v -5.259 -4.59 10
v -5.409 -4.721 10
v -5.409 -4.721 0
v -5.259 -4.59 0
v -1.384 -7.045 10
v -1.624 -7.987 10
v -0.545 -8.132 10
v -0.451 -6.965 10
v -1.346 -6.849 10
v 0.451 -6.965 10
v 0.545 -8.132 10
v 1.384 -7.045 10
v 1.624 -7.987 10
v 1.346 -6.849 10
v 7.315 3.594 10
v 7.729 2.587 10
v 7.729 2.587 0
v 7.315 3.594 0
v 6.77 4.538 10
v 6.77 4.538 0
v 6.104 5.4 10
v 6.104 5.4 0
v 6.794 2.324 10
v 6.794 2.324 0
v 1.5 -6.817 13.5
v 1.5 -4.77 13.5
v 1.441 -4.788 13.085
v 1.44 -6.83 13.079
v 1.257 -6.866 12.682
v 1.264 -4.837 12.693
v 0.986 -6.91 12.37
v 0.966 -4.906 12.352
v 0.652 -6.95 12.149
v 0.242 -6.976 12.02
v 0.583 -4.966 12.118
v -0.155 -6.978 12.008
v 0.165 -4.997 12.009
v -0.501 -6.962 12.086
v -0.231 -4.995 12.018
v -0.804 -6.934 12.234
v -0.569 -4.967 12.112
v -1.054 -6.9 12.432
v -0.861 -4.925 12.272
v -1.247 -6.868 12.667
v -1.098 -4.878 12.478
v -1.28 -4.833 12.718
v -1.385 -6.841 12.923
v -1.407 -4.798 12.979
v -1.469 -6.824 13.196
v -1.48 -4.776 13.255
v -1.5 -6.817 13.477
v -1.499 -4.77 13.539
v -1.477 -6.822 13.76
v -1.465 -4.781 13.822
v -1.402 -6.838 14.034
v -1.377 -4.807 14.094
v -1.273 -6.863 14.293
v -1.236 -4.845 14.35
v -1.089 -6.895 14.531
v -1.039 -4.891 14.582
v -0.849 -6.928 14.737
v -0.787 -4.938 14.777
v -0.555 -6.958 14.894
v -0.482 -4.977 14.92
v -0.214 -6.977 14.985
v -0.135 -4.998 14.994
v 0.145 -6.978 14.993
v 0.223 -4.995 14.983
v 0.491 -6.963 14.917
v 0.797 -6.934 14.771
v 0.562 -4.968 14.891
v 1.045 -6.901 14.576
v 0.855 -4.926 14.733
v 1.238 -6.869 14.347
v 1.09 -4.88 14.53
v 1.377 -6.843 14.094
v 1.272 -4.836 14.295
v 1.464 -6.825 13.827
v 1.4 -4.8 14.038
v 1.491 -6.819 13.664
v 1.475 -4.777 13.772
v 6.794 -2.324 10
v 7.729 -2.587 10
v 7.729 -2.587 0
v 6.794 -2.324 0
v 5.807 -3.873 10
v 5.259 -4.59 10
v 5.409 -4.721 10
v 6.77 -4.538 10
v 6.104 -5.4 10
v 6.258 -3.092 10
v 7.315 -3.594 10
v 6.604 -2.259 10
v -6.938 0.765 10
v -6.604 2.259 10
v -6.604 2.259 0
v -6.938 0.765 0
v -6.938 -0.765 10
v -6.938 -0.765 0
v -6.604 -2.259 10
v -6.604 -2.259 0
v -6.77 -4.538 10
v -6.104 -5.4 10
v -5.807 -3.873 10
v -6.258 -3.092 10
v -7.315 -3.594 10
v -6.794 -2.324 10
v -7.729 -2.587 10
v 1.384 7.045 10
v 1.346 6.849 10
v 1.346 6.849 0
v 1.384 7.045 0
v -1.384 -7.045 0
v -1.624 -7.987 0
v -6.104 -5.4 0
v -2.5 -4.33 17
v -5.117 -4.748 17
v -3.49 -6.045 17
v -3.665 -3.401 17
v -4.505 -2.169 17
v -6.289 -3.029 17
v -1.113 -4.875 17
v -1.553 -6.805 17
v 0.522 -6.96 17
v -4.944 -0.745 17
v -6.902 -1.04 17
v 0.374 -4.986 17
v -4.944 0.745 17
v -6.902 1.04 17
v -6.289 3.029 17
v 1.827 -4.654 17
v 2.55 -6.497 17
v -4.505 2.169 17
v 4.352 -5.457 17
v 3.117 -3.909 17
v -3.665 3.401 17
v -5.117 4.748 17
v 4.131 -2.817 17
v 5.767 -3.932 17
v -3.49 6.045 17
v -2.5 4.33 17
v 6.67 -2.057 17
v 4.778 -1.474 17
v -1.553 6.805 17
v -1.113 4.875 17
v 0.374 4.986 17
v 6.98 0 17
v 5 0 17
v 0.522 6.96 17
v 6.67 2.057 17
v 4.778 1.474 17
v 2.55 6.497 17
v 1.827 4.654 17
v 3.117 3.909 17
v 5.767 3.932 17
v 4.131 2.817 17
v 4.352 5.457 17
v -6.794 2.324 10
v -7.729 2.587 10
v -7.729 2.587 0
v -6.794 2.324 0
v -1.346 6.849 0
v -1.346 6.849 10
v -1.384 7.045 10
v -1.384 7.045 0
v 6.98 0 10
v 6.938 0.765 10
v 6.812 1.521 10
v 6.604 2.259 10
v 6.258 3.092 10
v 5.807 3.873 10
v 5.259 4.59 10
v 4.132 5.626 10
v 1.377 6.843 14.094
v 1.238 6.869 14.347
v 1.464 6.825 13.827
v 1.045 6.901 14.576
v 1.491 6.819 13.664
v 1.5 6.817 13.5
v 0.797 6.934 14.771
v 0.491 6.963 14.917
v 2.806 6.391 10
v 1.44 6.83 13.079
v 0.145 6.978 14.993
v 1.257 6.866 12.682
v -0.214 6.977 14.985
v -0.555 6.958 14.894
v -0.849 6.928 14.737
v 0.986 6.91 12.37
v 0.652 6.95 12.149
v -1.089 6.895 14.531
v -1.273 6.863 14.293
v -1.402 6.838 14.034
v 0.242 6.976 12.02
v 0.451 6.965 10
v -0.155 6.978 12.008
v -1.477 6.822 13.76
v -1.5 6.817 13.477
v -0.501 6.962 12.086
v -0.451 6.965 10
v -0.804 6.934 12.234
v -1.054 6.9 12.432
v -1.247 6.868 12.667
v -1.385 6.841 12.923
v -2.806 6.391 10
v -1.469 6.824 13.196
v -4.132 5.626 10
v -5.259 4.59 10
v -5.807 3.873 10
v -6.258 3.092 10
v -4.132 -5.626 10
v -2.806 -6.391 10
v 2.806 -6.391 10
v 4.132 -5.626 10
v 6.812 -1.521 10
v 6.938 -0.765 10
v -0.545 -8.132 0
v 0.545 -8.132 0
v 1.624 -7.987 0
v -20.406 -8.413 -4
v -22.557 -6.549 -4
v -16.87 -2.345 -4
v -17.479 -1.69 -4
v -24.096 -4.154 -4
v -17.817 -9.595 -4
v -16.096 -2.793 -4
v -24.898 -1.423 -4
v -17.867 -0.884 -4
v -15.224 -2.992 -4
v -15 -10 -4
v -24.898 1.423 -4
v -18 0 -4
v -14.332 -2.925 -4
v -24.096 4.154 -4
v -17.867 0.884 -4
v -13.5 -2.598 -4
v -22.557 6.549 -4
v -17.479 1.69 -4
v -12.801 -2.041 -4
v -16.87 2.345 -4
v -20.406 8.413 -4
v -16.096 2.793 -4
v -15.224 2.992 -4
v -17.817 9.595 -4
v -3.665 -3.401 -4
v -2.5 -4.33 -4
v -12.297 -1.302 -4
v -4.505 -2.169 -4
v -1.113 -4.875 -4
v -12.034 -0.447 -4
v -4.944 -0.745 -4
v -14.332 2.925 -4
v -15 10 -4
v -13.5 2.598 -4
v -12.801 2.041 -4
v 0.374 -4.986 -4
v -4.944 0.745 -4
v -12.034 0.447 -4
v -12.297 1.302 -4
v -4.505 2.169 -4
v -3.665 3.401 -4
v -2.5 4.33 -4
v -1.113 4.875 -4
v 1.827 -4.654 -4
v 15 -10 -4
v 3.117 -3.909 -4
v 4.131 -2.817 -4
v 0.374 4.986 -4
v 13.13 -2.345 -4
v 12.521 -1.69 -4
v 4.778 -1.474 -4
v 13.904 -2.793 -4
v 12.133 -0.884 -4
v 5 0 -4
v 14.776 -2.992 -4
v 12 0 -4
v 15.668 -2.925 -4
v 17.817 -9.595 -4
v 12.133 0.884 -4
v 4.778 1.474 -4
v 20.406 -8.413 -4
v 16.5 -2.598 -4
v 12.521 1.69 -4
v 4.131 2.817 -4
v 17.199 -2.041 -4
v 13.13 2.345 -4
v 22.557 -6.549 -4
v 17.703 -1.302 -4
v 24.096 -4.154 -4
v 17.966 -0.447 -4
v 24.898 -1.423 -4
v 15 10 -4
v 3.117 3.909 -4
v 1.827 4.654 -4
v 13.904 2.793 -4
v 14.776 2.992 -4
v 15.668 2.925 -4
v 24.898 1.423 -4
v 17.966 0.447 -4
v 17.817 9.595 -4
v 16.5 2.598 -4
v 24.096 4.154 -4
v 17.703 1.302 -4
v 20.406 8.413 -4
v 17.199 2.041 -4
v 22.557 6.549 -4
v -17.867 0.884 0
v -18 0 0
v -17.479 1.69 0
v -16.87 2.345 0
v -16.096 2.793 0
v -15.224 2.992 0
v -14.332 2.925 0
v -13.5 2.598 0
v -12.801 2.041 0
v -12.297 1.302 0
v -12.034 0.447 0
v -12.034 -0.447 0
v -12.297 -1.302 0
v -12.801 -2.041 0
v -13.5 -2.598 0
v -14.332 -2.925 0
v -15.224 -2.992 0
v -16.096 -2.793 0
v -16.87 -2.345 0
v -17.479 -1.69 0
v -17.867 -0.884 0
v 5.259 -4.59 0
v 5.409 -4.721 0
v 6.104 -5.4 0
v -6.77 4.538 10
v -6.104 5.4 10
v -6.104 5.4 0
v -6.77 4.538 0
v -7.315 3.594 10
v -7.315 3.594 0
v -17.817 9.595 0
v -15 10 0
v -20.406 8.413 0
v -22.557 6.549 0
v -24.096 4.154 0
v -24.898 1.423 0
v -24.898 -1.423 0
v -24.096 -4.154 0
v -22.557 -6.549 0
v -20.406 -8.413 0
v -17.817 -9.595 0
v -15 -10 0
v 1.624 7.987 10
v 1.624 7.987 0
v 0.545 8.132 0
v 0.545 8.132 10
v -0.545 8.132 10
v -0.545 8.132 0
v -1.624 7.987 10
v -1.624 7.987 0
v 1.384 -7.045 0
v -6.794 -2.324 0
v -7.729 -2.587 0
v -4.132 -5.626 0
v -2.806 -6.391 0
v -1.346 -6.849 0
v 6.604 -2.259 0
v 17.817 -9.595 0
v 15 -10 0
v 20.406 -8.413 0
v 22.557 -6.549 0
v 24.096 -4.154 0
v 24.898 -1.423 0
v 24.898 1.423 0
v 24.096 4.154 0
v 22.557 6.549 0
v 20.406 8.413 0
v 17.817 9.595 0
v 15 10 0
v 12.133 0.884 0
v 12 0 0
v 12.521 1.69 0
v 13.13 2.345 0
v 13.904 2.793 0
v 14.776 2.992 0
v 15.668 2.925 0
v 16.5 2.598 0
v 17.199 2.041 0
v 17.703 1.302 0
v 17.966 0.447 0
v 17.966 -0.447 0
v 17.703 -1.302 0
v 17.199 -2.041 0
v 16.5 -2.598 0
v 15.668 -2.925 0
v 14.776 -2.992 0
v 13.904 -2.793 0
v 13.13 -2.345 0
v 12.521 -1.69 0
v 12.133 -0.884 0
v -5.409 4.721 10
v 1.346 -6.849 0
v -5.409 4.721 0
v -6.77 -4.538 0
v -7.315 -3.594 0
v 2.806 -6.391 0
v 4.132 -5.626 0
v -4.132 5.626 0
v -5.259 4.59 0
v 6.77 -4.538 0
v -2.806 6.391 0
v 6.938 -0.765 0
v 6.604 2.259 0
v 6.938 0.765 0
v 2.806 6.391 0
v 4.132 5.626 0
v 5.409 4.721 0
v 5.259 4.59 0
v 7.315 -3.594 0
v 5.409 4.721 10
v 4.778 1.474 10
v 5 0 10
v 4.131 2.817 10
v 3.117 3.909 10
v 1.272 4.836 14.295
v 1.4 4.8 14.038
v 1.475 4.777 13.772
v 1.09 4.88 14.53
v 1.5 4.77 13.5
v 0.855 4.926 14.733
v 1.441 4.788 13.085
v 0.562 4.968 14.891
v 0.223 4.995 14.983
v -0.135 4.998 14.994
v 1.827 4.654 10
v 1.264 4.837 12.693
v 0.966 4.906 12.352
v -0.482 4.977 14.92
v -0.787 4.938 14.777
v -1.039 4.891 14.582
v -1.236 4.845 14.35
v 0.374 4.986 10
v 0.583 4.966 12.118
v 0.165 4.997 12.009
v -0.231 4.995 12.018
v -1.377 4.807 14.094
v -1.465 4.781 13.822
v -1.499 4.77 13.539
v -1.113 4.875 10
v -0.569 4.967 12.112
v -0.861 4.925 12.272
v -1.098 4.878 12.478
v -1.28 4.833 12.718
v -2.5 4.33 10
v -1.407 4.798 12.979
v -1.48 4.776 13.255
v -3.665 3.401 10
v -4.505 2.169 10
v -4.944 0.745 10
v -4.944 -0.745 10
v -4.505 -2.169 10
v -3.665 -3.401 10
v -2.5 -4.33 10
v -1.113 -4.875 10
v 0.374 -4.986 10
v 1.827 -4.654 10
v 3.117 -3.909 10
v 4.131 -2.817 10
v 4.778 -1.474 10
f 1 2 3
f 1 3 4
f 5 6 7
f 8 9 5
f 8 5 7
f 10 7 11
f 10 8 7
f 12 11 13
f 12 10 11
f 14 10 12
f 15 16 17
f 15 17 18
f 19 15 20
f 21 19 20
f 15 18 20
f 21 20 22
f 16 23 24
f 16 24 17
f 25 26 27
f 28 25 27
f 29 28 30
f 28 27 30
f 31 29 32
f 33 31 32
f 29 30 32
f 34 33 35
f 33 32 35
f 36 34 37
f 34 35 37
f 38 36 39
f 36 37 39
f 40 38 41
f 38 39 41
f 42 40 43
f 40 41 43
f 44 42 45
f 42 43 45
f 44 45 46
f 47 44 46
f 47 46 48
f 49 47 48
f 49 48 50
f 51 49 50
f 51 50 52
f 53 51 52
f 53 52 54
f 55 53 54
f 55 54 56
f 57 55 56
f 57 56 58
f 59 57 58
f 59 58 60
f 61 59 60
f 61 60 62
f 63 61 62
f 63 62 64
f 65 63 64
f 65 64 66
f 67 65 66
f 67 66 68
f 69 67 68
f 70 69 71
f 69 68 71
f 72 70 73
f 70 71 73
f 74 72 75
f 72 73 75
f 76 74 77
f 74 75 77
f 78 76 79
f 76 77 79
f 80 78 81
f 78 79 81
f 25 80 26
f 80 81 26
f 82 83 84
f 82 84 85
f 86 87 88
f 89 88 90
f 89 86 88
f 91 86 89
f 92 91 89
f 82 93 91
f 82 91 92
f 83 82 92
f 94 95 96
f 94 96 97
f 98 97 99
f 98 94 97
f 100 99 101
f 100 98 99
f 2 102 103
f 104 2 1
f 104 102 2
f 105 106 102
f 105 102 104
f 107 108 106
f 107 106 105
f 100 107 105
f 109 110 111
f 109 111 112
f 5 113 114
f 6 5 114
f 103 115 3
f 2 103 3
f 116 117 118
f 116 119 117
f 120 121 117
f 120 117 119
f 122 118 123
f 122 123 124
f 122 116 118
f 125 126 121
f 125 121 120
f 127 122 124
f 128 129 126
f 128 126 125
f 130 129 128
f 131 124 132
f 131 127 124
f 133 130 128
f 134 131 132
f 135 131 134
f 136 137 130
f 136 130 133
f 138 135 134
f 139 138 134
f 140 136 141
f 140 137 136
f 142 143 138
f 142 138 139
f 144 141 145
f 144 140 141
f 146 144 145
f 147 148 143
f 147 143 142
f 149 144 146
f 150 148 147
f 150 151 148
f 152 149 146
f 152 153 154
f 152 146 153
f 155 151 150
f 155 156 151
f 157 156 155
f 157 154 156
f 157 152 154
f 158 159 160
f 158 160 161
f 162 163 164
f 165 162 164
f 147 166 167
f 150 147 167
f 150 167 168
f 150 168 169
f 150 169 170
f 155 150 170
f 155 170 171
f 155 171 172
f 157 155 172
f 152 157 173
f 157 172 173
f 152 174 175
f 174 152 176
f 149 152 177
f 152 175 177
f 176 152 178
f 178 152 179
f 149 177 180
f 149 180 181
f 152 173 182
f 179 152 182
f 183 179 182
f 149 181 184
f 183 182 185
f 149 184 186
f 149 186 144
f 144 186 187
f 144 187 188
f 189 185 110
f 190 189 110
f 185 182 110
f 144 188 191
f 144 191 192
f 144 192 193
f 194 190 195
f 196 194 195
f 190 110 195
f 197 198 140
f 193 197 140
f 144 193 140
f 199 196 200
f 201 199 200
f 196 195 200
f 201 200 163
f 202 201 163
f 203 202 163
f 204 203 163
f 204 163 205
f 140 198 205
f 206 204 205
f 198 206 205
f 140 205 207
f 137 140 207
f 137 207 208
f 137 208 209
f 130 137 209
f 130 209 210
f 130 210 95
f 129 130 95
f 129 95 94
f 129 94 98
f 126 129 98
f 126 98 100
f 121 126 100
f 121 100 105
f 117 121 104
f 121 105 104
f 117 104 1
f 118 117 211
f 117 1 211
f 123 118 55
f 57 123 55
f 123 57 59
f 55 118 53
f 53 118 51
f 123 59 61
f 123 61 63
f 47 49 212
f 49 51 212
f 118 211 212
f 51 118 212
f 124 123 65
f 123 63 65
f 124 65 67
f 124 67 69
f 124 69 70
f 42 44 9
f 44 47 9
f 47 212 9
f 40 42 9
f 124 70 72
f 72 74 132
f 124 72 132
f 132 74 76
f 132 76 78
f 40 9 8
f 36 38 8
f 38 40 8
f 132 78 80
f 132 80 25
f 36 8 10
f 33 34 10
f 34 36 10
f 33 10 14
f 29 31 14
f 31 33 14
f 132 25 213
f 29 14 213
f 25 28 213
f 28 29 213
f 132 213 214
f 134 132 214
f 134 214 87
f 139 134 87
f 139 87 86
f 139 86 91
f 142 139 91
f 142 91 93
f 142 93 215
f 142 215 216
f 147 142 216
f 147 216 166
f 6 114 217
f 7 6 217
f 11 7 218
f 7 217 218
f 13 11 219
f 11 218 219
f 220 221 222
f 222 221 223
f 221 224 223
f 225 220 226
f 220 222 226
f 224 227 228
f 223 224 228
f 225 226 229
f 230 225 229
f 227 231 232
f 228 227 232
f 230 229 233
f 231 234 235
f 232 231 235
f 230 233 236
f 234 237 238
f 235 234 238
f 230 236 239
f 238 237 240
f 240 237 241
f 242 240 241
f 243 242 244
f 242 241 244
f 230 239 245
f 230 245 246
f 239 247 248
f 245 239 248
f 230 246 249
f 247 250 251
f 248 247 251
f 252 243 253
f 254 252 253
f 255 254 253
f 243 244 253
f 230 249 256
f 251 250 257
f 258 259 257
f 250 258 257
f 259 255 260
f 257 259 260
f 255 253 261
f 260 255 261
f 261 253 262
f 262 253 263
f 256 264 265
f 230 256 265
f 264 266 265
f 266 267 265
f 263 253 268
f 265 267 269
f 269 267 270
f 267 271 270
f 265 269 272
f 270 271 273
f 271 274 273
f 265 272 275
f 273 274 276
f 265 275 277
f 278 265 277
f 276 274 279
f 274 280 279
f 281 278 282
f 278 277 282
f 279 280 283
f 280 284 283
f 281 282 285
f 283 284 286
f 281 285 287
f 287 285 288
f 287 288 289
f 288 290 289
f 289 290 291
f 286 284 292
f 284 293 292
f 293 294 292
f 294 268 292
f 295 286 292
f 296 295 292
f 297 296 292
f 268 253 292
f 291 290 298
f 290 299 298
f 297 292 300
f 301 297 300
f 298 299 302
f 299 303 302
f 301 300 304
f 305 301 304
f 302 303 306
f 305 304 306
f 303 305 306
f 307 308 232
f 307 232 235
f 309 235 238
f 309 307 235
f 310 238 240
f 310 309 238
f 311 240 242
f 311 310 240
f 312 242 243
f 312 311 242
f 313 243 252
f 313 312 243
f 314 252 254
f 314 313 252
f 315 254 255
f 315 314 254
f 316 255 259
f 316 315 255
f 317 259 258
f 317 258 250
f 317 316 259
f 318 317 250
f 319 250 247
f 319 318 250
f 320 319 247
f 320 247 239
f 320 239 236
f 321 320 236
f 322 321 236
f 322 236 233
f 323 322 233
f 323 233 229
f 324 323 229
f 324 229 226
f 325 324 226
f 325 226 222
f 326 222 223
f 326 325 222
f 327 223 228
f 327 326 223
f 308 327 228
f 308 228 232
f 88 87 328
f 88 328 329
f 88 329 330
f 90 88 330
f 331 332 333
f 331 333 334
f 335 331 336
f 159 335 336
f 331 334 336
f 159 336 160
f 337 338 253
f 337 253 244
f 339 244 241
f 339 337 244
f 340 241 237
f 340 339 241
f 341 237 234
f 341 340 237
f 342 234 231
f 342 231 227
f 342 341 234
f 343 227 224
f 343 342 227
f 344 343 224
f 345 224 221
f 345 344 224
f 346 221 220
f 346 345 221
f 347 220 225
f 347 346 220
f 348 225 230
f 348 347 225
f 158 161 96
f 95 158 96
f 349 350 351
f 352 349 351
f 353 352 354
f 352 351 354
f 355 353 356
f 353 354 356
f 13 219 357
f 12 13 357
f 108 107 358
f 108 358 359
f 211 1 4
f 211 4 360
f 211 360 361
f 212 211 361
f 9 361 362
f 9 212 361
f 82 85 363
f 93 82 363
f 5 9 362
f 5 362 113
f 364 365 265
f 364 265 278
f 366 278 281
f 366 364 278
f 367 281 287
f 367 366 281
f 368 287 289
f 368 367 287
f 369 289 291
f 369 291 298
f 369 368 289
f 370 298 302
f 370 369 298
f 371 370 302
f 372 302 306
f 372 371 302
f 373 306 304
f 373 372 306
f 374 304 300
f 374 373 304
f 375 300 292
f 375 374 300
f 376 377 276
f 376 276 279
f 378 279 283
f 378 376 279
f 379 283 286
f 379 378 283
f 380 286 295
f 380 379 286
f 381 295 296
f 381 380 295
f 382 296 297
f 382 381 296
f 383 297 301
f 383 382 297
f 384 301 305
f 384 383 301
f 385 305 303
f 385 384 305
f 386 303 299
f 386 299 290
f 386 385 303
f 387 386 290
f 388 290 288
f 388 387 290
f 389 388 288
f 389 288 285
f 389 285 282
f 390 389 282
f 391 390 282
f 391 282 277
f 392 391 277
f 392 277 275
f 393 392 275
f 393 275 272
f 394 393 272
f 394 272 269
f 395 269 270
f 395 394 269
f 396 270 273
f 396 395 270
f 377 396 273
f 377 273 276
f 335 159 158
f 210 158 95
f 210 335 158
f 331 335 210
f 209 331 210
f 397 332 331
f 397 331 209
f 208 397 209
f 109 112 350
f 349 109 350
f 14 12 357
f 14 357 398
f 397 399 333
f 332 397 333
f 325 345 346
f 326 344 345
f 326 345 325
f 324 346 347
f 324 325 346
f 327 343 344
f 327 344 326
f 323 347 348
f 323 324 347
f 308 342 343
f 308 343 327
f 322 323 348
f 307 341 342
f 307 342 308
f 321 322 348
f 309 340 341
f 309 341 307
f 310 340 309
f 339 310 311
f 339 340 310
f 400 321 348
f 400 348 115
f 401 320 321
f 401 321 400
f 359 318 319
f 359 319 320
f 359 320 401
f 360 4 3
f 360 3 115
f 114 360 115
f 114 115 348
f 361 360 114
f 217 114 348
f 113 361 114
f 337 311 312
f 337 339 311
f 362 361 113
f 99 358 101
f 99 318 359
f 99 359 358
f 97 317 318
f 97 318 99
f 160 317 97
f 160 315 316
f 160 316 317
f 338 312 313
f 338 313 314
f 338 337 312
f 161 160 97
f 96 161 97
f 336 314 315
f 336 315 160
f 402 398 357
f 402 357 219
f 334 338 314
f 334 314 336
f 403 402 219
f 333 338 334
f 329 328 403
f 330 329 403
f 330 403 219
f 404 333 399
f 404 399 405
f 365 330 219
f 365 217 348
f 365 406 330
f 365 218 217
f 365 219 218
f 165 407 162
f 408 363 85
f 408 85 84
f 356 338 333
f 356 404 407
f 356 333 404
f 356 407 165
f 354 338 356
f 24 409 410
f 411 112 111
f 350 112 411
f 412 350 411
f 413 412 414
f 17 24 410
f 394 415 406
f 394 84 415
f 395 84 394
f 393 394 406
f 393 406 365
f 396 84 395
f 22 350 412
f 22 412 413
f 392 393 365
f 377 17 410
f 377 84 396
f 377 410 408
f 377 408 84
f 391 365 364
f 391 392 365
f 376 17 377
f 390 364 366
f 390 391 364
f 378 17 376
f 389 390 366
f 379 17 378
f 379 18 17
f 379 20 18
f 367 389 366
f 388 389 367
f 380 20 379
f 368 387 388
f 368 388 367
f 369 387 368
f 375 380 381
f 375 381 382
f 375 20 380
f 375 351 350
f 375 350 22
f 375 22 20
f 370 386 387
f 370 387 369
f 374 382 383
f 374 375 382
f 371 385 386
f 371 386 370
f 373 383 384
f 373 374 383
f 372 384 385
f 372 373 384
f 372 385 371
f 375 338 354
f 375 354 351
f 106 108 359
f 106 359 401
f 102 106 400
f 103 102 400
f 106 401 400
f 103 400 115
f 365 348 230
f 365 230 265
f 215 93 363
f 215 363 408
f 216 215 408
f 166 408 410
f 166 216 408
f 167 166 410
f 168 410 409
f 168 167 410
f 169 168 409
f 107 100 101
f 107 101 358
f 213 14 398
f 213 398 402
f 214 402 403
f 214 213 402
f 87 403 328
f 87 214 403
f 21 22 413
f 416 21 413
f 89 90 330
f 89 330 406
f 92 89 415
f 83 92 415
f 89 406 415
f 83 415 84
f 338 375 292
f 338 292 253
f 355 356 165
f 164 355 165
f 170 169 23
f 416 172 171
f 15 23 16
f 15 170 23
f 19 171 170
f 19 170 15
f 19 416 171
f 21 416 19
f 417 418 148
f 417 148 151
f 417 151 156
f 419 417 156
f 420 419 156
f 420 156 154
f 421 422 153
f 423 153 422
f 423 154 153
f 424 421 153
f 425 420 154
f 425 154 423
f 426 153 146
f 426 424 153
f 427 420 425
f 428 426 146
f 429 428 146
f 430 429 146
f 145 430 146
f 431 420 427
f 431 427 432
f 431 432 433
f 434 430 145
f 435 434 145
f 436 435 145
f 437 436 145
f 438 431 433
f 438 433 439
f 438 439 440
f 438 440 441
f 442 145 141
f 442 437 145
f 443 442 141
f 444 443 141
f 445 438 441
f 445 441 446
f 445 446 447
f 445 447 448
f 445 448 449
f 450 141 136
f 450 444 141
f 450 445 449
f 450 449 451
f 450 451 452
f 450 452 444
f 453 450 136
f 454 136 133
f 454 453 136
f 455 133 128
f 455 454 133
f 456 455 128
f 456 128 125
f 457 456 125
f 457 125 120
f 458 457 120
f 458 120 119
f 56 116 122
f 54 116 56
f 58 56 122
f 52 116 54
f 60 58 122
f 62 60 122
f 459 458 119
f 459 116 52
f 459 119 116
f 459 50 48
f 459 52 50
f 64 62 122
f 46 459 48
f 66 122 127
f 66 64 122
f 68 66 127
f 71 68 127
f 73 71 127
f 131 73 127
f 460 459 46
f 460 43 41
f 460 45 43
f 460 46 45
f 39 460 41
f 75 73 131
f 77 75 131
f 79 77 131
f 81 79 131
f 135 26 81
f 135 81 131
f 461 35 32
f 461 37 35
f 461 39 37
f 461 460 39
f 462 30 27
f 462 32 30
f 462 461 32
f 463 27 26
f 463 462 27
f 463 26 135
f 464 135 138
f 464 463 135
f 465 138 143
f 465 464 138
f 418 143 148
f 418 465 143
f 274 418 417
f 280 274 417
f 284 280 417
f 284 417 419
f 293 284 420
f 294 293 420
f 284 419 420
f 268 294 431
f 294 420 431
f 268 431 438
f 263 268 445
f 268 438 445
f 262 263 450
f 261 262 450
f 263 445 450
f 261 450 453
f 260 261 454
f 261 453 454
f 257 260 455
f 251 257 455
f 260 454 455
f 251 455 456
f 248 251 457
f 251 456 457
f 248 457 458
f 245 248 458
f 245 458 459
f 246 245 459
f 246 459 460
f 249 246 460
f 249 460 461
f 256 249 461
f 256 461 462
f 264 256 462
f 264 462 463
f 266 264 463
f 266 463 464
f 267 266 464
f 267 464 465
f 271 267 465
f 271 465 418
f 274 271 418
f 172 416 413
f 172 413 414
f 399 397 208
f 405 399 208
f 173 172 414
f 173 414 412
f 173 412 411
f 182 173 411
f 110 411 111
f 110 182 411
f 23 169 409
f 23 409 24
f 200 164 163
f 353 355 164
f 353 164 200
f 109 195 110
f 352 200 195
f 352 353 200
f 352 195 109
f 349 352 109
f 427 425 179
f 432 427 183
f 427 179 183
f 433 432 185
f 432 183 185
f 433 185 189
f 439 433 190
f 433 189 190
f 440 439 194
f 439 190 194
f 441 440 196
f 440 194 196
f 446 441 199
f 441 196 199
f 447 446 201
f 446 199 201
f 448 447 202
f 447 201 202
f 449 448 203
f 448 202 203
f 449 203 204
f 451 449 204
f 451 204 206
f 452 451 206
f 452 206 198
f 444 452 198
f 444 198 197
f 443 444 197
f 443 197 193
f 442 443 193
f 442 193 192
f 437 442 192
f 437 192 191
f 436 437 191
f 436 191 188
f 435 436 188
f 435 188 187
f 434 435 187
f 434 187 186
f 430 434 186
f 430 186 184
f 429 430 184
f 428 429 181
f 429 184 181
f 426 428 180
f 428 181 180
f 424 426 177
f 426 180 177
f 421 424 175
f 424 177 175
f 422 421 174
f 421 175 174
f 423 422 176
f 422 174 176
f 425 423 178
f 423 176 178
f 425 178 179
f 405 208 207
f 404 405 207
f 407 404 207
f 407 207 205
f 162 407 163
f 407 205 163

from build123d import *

# Parameters (mm, degrees)
BOSS_EXTRUDE1_DEPTH = 10
SKETCH4_R           = 3
BOSS_EXTRUDE2_DEPTH = 4
CUT_EXTRUDE2_DEPTH  = 10
SKETCH9_R           = 5
CUT_EXTRUDE3_DEPTH  = 15
SKETCH10_R          = 6.98
SKETCH10_R_2        = 5
BOSS_EXTRUDE3_DEPTH = 7
SKETCH11_R          = 1.5
CUT_EXTRUDE4_DEPTH  = 21


with BuildPart() as part:
    # Sketch3 → Boss-Extrude1 (new body)
    with BuildSketch(Plane.XY):
        with BuildLine():
            Line((-7.72865, 2.586593), (-6.793519, 2.323899))
            ThreePointArc((-6.793519, 2.323899), (-7.18, 0), (-6.793519, -2.323899))
            Line((-6.793519, -2.323899), (-7.72865, -2.586593))
            ThreePointArc((-7.72865, -2.586593), (-7.058107, -4.075), (-6.104381, -5.399911))
            Line((-6.104381, -5.399911), (-5.409315, -4.72141))
            ThreePointArc((-5.409315, -4.72141), (-3.59, -6.218062), (-1.384204, -7.045309))
            Line((-1.384204, -7.045309), (-1.62427, -7.986504))
            ThreePointArc((-1.62427, -7.986504), (0, -8.15), (1.62427, -7.986504))
            Line((1.62427, -7.986504), (1.384204, -7.045309))
            ThreePointArc((1.384204, -7.045309), (3.59, -6.218062), (5.409315, -4.72141))
            Line((5.409315, -4.72141), (6.104381, -5.399911))
            ThreePointArc((6.104381, -5.399911), (7.058107, -4.075), (7.72865, -2.586593))
            Line((7.72865, -2.586593), (6.793519, -2.323899))
            ThreePointArc((6.793519, -2.323899), (7.18, 0), (6.793519, 2.323899))
            Line((6.793519, 2.323899), (7.72865, 2.586593))
            ThreePointArc((7.72865, 2.586593), (7.058107, 4.075), (6.104381, 5.399911))
            Line((6.104381, 5.399911), (5.409315, 4.72141))
            ThreePointArc((5.409315, 4.72141), (3.59, 6.218062), (1.384204, 7.045309))
            Line((1.384204, 7.045309), (1.62427, 7.986504))
            ThreePointArc((1.62427, 7.986504), (0, 8.15), (-1.62427, 7.986504))
            Line((-1.62427, 7.986504), (-1.384204, 7.045309))
            ThreePointArc((-1.384204, 7.045309), (-3.59, 6.218062), (-5.409315, 4.72141))
            Line((-5.409315, 4.72141), (-6.104381, 5.399911))
            ThreePointArc((-6.104381, 5.399911), (-7.058107, 4.075), (-7.72865, 2.586593))
        make_face()
    extrude(amount=BOSS_EXTRUDE1_DEPTH)

    # Sketch4 → Boss-Extrude2 (add)
    with BuildSketch(Plane(origin=(0, 0, 0), x_dir=(-1, 0, 0), z_dir=(0, 0, -1))):
        with BuildLine():
            Line((-15, 10), (15, 10))
            ThreePointArc((15, 10), (25, 0), (15, -10))
            Line((15, -10), (-15, -10))
            ThreePointArc((-15, -10), (-25, 0), (-15, 10))
        make_face()
        with Locations((-15, 0)):
            Circle(SKETCH4_R, mode=Mode.SUBTRACT)
        with Locations((15, 0)):
            Circle(SKETCH4_R, mode=Mode.SUBTRACT)
    extrude(amount=BOSS_EXTRUDE2_DEPTH)

    # Sketch8 → Cut-Extrude2 (cut)
    with BuildSketch(Plane.XY.offset(10)):
        with BuildLine():
            Line((-5.409315, 4.72141), (-5.258637, 4.589895))
            ThreePointArc((-5.258637, 4.589895), (-3.49, 6.044857), (-1.345647, 6.849061))
            Line((-1.345647, 6.849061), (-1.384204, 7.045309))
            ThreePointArc((-1.384204, 7.045309), (-3.59, 6.218062), (-5.409315, 4.72141))
        make_face()
        with BuildLine():
            Line((5.409315, 4.72141), (5.258637, 4.589895))
            ThreePointArc((5.258637, 4.589895), (3.49, 6.044857), (1.345647, 6.849061))
            Line((1.345647, 6.849061), (1.384204, 7.045309))
            ThreePointArc((1.384204, 7.045309), (3.59, 6.218062), (5.409315, 4.72141))
        make_face()
        with BuildLine():
            Line((6.793519, -2.323899), (6.604284, -2.259166))
            ThreePointArc((6.604284, -2.259166), (6.98, 0), (6.604284, 2.259166))
            Line((6.604284, 2.259166), (6.793519, 2.323899))
            ThreePointArc((6.793519, 2.323899), (7.18, 0), (6.793519, -2.323899))
        make_face()
        with BuildLine():
            Line((1.384204, -7.045309), (1.345647, -6.849061))
            ThreePointArc((1.345647, -6.849061), (3.49, -6.044857), (5.258637, -4.589895))
            Line((5.258637, -4.589895), (5.409315, -4.72141))
            ThreePointArc((5.409315, -4.72141), (3.59, -6.218062), (1.384204, -7.045309))
        make_face()
        with BuildLine():
            Line((-5.409315, -4.72141), (-5.258637, -4.589895))
            ThreePointArc((-5.258637, -4.589895), (-3.49, -6.044857), (-1.345647, -6.849061))
            Line((-1.345647, -6.849061), (-1.384204, -7.045309))
            ThreePointArc((-1.384204, -7.045309), (-3.59, -6.218062), (-5.409315, -4.72141))
        make_face()
        with BuildLine():
            Line((-6.793519, 2.323899), (-6.604284, 2.259166))
            ThreePointArc((-6.604284, 2.259166), (-6.98, 0), (-6.604284, -2.259166))
            Line((-6.604284, -2.259166), (-6.793519, -2.323899))
            ThreePointArc((-6.793519, -2.323899), (-7.18, 0), (-6.793519, 2.323899))
        make_face()
    extrude(amount=-CUT_EXTRUDE2_DEPTH, mode=Mode.SUBTRACT)

    # Sketch9 → Cut-Extrude3 (cut, through all)
    with BuildSketch(Plane.XY.offset(10)):
        Circle(SKETCH9_R)
    extrude(amount=-CUT_EXTRUDE3_DEPTH, mode=Mode.SUBTRACT)

    # Sketch10 → Boss-Extrude3 (add)
    with BuildSketch(Plane.XY.offset(10)):
        Circle(SKETCH10_R)
        Circle(SKETCH10_R_2, mode=Mode.SUBTRACT)
    extrude(amount=BOSS_EXTRUDE3_DEPTH)

    # Sketch11 → Cut-Extrude4 (cut, through all)
    with BuildSketch(Plane(origin=(0, 10, 0), x_dir=(1, 0, 0), z_dir=(0, 1, 0))):
        with Locations((0, -13.5)):
            Circle(SKETCH11_R)
    extrude(amount=-CUT_EXTRUDE4_DEPTH, mode=Mode.SUBTRACT)


solid = part.part
